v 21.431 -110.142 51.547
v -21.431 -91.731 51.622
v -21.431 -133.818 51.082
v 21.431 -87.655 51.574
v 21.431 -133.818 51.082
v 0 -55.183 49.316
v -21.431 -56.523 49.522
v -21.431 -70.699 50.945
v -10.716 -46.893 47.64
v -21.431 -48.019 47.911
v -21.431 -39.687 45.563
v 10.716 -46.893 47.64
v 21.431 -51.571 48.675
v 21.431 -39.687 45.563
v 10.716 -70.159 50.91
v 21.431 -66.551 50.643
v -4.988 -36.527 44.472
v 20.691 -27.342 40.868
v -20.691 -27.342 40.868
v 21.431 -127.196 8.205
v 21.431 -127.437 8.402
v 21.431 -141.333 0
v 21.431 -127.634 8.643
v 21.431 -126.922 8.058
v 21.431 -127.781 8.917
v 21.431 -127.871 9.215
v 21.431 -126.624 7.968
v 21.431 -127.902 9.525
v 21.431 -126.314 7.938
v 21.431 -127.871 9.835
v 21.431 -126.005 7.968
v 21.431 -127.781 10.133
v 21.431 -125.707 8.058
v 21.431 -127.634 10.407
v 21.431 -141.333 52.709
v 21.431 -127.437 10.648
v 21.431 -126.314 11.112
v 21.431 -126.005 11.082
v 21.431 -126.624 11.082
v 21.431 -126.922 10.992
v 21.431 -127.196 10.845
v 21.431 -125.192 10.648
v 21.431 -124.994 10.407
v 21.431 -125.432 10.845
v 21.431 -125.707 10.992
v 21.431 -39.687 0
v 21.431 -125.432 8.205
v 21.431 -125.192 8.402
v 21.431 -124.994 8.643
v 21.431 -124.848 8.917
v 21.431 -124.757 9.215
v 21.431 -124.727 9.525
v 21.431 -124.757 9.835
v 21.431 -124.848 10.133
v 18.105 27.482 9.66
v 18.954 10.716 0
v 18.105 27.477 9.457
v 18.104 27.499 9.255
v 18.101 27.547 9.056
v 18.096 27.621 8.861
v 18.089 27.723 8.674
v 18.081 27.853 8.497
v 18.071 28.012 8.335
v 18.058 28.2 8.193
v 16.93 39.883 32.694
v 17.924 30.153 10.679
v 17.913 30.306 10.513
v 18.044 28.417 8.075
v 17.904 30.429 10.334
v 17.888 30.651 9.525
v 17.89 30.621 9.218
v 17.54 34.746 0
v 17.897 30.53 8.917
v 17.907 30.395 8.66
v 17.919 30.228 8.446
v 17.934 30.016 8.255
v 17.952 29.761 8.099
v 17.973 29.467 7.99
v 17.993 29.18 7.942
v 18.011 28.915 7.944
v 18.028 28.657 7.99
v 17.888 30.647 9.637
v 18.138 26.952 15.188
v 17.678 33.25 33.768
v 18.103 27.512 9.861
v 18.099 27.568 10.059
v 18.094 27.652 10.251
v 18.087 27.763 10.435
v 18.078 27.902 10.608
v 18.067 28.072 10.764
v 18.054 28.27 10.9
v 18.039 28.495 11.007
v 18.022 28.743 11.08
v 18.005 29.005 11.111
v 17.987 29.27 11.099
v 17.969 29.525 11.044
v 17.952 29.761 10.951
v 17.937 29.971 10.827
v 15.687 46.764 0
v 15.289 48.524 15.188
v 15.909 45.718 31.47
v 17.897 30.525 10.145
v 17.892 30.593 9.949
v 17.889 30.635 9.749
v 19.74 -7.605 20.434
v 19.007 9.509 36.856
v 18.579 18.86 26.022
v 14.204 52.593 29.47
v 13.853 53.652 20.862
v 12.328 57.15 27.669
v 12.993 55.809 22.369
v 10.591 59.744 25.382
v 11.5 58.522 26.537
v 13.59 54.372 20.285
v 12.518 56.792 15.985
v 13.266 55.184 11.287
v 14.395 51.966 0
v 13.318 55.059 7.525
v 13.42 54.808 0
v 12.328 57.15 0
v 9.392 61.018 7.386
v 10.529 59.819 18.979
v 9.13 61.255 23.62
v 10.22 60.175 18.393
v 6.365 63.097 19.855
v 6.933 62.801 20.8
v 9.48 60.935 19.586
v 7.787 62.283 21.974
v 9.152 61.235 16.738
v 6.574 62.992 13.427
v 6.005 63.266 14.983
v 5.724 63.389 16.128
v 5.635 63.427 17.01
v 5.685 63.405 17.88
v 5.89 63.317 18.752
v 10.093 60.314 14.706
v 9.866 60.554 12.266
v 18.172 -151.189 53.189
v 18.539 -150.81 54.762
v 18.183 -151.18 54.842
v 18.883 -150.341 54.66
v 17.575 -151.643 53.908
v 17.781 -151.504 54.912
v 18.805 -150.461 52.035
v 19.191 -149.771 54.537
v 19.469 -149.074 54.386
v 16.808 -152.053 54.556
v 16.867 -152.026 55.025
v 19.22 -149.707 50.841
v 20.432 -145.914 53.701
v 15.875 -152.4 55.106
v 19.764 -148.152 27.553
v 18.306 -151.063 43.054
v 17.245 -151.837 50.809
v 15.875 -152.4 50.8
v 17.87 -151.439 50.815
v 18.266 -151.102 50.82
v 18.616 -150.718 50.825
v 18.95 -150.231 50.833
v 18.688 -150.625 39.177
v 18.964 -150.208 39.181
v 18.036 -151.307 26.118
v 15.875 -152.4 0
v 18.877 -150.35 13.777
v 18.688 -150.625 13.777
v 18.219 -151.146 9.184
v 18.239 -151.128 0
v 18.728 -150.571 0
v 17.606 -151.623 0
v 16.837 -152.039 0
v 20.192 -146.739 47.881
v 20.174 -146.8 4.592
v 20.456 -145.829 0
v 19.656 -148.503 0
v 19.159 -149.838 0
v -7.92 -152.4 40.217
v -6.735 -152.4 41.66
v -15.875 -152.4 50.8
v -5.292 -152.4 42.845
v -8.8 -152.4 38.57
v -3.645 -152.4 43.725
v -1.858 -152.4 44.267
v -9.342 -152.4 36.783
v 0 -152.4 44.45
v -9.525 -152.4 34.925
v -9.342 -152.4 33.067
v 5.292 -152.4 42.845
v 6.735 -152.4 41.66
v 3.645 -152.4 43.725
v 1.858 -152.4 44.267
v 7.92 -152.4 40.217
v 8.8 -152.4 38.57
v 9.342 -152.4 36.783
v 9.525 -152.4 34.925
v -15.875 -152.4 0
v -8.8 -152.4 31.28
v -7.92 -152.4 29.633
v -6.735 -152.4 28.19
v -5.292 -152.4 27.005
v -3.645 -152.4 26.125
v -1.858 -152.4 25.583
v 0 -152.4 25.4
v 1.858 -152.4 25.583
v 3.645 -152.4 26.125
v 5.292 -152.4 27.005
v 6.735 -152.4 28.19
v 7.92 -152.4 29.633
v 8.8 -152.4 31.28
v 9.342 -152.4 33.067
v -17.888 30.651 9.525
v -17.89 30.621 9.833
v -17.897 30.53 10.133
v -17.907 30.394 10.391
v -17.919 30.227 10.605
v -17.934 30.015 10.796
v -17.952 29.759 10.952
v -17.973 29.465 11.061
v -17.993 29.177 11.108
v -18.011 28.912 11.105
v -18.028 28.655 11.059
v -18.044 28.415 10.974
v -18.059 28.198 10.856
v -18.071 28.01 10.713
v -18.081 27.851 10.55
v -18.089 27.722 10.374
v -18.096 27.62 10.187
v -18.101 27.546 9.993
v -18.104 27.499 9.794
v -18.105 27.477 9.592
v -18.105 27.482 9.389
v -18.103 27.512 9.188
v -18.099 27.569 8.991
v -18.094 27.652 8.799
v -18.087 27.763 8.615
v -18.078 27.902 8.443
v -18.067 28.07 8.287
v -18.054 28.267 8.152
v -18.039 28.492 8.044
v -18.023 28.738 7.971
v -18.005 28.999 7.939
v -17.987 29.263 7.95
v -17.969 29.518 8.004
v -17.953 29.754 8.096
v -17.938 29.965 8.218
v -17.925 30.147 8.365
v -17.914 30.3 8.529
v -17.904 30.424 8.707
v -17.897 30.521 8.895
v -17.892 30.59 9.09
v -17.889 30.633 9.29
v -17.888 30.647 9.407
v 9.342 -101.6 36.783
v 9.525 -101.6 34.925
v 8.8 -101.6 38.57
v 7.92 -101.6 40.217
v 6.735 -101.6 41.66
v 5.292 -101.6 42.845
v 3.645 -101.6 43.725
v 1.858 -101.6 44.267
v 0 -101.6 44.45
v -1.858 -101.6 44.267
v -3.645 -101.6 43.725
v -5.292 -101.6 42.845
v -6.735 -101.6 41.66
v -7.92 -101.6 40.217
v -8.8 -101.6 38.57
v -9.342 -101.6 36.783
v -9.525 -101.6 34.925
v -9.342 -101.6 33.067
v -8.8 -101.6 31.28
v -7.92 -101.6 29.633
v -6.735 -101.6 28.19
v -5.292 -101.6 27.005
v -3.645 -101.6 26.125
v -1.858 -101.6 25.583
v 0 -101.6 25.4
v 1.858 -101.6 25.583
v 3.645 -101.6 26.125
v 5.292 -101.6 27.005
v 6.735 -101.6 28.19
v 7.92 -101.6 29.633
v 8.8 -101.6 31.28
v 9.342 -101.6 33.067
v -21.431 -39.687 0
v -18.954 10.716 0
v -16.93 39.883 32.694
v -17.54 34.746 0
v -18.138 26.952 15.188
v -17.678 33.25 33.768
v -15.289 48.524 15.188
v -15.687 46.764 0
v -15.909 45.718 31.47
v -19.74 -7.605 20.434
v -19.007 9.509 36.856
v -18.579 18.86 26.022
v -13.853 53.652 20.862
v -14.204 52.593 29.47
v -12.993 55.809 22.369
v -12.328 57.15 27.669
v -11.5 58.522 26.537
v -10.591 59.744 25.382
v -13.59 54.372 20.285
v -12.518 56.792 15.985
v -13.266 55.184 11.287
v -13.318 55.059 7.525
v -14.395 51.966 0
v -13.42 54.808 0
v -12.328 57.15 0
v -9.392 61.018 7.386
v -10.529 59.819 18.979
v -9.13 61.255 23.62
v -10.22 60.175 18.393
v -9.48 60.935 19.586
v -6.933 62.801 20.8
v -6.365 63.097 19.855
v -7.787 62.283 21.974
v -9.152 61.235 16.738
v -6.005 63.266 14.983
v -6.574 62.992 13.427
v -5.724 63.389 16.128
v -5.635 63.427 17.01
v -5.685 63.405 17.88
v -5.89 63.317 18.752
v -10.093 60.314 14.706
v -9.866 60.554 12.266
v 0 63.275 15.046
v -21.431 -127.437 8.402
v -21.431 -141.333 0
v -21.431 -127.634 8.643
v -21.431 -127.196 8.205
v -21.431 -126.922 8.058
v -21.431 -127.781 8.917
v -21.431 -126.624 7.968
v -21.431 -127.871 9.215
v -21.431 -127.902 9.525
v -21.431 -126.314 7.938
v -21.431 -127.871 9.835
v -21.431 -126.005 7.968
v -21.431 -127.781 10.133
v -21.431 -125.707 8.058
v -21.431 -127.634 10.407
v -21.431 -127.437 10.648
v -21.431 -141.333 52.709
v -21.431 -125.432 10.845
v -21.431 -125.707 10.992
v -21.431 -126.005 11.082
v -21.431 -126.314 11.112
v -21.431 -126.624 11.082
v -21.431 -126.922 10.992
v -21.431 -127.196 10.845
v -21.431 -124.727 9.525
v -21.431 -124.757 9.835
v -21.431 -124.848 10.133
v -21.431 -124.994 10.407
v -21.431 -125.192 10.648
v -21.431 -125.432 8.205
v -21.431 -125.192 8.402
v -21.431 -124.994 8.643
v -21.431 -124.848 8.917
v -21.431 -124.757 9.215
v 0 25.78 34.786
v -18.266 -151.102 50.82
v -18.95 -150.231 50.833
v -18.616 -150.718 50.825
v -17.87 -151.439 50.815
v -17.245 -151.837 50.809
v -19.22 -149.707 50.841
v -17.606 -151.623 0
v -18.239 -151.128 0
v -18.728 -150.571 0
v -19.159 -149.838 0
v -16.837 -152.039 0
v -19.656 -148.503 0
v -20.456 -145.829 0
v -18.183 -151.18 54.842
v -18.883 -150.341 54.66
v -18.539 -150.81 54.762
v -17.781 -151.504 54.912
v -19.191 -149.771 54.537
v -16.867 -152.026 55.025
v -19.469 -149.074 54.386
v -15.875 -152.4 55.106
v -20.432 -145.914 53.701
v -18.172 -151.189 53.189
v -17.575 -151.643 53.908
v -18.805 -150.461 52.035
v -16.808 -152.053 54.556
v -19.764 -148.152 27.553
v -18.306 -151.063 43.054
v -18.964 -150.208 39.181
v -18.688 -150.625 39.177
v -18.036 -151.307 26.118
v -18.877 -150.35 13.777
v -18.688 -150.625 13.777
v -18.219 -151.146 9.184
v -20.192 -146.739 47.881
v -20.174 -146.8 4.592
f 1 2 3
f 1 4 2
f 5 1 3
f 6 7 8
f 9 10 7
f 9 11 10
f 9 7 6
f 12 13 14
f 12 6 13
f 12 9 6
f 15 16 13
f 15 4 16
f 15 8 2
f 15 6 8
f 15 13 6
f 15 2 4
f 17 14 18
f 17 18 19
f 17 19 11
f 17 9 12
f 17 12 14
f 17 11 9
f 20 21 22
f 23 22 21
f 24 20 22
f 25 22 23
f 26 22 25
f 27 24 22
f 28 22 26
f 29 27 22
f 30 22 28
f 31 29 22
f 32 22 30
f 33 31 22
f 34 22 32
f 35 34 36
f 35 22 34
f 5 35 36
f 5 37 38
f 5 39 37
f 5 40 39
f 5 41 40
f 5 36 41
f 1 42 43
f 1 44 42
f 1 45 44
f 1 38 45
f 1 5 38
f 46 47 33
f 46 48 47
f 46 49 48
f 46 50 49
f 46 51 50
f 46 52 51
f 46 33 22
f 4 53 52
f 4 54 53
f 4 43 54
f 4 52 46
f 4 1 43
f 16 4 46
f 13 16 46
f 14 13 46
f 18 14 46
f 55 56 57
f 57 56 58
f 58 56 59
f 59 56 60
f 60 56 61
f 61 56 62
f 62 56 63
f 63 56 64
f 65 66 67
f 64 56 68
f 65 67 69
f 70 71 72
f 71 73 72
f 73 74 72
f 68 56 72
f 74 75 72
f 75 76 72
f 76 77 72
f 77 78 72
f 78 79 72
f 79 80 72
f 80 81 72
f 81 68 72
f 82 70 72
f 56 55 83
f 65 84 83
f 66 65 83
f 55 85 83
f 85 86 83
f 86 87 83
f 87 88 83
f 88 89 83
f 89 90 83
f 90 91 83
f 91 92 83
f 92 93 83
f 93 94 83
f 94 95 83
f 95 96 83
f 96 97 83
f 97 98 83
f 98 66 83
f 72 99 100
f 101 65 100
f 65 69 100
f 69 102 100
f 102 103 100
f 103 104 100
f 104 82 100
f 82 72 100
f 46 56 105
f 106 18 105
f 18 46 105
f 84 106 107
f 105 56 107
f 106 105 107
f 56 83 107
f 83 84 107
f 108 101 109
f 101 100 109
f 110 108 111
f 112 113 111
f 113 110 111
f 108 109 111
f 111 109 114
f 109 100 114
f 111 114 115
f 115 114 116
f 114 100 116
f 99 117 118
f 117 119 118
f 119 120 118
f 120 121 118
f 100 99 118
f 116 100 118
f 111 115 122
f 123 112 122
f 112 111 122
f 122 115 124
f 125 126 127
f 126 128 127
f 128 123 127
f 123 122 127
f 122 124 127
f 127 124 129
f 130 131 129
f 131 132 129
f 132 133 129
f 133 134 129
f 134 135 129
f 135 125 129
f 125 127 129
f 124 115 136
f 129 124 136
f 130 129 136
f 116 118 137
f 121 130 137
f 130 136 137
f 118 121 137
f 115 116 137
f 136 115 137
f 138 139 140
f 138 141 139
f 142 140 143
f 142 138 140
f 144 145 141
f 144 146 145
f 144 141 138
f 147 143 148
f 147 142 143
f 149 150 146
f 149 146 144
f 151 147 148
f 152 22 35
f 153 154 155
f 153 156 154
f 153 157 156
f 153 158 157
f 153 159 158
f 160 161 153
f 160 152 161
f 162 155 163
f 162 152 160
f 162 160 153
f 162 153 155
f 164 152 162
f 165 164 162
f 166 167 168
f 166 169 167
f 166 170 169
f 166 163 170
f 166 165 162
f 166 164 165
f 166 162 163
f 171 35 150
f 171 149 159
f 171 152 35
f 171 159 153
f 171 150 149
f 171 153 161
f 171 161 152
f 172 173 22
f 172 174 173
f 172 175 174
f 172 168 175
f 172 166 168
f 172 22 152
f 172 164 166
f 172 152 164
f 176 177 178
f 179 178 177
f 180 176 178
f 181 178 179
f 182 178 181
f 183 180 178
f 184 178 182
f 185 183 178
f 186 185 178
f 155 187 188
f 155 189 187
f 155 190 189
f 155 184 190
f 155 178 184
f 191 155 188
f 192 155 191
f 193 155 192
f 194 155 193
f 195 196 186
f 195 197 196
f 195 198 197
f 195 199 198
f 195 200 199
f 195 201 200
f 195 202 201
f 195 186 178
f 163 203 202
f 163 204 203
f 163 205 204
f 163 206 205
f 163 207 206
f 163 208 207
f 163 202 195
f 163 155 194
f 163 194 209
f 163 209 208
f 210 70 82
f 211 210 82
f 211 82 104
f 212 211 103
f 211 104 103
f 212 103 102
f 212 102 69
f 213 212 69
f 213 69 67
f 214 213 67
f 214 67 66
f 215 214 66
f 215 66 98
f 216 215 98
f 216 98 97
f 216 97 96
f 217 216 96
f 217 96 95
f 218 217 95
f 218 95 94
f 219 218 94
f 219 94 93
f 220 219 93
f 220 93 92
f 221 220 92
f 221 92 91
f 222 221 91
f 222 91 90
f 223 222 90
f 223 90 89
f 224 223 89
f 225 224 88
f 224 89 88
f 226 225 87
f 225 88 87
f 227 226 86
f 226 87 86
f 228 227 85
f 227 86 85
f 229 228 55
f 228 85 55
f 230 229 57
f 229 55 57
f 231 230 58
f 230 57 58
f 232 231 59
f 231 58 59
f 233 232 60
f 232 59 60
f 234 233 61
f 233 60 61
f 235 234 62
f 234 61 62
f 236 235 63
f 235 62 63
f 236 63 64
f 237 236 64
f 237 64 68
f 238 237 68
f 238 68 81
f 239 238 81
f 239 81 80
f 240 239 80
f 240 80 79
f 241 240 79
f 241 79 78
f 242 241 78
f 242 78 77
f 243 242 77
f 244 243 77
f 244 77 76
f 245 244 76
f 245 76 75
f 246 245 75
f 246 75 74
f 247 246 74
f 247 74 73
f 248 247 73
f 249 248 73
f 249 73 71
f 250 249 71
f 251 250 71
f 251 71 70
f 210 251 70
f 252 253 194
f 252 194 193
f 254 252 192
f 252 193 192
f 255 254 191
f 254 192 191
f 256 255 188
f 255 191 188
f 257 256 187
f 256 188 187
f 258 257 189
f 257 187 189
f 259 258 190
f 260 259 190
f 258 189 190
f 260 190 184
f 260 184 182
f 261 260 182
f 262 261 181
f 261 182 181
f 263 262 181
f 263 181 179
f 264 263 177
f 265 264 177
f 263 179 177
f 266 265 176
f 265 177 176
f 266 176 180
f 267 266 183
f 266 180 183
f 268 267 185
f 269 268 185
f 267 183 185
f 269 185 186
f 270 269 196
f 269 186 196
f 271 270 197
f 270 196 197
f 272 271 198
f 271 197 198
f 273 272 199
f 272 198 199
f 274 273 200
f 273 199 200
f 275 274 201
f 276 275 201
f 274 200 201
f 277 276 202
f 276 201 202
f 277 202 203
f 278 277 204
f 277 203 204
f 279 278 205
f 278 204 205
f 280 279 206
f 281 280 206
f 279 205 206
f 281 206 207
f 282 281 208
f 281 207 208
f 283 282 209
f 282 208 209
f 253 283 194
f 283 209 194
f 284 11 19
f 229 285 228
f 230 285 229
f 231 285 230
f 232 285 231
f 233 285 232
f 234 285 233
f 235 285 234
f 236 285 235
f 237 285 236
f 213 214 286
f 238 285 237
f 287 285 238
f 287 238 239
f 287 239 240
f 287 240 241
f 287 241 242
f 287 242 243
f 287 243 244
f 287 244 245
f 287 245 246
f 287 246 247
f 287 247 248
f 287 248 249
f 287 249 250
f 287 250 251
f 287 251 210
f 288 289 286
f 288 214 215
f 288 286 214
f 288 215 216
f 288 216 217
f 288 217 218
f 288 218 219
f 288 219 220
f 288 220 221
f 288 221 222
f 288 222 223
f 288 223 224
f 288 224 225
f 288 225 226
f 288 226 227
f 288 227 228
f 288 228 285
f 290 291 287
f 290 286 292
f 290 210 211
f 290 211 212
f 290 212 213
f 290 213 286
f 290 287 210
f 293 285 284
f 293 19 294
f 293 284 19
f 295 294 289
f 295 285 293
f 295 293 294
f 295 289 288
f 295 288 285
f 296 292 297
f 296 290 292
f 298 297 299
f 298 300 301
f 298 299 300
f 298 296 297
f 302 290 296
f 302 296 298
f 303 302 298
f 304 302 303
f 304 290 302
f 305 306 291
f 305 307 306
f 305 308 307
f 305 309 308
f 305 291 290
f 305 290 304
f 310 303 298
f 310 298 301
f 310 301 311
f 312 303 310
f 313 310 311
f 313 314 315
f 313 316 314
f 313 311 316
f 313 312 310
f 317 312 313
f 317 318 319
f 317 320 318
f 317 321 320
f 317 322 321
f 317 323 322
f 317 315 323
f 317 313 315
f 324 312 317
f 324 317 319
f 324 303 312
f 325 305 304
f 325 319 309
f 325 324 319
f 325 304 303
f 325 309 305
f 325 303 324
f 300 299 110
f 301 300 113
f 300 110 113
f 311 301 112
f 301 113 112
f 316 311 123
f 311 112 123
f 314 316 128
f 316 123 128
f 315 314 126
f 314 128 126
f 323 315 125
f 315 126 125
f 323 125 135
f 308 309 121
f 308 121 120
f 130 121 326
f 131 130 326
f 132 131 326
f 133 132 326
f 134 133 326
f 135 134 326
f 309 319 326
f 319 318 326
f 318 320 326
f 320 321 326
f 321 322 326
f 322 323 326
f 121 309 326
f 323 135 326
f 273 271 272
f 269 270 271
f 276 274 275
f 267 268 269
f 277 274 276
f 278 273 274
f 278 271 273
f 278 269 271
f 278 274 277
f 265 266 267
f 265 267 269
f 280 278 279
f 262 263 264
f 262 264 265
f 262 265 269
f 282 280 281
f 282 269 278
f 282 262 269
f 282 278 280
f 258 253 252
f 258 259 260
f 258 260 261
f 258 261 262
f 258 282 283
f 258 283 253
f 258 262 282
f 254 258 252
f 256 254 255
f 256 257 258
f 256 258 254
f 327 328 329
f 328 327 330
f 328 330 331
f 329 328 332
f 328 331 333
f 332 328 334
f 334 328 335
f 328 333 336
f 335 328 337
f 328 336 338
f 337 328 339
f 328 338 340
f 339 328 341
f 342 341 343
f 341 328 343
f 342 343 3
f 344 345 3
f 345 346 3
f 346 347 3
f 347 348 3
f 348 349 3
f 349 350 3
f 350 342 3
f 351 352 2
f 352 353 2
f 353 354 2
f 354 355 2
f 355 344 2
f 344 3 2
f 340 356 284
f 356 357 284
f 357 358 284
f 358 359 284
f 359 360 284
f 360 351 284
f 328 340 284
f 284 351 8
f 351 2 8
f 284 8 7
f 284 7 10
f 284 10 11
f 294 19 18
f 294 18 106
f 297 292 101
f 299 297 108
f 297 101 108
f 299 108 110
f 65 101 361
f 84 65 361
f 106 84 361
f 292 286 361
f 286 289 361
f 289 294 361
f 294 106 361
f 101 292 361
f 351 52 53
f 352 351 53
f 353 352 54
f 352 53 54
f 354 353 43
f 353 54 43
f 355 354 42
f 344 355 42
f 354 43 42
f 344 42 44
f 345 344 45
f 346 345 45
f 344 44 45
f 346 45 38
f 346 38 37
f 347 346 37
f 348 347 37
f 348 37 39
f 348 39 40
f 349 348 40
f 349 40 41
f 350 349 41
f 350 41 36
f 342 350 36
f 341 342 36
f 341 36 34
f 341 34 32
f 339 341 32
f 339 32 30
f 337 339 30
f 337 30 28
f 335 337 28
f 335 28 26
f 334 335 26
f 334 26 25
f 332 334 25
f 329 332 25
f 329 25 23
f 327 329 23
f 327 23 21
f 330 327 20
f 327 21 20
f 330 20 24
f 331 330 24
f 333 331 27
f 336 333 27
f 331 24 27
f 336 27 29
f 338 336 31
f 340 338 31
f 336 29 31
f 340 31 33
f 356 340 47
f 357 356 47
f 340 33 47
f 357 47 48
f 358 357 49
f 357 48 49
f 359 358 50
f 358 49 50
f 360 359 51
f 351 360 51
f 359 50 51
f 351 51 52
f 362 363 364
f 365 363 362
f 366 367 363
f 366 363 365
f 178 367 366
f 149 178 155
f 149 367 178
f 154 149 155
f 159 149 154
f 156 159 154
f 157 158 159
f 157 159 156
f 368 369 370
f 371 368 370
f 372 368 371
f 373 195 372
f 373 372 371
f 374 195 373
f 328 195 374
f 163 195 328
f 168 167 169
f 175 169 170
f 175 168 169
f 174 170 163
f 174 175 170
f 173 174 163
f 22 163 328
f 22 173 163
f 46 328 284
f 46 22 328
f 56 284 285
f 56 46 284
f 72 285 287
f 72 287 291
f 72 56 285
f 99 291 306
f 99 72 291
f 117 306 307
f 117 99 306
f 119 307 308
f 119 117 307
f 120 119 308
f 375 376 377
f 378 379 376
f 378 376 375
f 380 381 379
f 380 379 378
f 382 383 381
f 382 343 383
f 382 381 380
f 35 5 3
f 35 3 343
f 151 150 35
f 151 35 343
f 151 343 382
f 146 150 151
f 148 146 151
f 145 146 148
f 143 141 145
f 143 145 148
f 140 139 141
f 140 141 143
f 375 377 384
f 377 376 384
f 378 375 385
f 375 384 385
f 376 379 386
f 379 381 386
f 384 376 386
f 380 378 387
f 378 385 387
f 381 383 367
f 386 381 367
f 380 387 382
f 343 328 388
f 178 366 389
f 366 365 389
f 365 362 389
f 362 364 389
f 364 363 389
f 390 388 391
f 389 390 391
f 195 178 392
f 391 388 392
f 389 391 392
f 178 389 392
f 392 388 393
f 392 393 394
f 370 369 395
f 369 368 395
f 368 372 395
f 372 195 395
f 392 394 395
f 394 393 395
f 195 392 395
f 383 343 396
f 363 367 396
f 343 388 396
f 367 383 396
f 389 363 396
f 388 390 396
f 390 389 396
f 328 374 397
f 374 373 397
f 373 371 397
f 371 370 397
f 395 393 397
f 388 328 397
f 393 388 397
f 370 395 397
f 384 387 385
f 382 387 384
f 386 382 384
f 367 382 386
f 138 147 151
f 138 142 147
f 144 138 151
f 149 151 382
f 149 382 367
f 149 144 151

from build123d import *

# Parameters (mm, degrees)
F1_DEPTH = 21.43125
F2_R     = 9.525
F3_DEPTH = 50.8
F4_R     = 1.5875
F6_DEPTH = 42.8635
F7_DEPTH = 55.1070625421


with BuildPart() as f1:
    # F0 (on Right) → F1 (new body, symmetric)
    with BuildSketch(Plane.YZ):
        Polygon((-152.4, 69.85), (-152.4, 0), (152.4, 0), (152.4, 19.05), align=None)
    extrude(amount=F1_DEPTH, both=True)

    # F2 (on face) → F3 (cut)
    with BuildSketch(Plane.XZ.offset(152.4)):
        with Locations((0, 34.925)):
            Circle(F2_R)
    extrude(amount=-F3_DEPTH, mode=Mode.SUBTRACT)

    # F4 (on face) → F6 (intersect, through all)
    with BuildSketch(Plane.YZ.offset(21.43125)):
        with BuildLine():
            Line((-149.7065071007, 50.8408099003), (-152.4, 50.7999993861))
            Line((-152.4, 50.7999993861), (-152.4, 0))
            Line((-152.4, 0), (57.15, 0))
            add(Edge.make_bspline(
                [(57.15, 27.6693087071), (62.9540532827, 23.1574121863), (64.8345353288, 15.2838414165), (60.2900164004, 5.1415623251), (57.15, 0)],
                knots=[0, 0, 0, 0, 0.4816979855, 1, 1, 1, 1], degree=3))
            add(Edge.make_bspline(
                [(-27.3415464908, 40.8684164286), (-8.4446382918, 39.1311924639), (24.8142205738, 35.0208202174), (47.8670857847, 31.8072736263), (57.15, 27.6693087071)],
                knots=[0, 0, 0, 0, 0.5631768545, 1, 1, 1, 1], degree=3))
            add(Edge.make_bspline(
                [(-27.3415464908, 40.8684164286), (-35.3624819778, 44.1492309528), (-56.5713824039, 52.8243373258), (-104.2014900273, 51.7497373627), (-133.8184987721, 51.0815373923)],
                knots=[0, 0, 0, 0, 0.3781872386, 1, 1, 1, 1], degree=3))
            Line((-133.8184987721, 51.0815373923), (-152.4, 55.1060624421))
            Line((-152.4, 55.1060624421), (-149.7065071007, 50.8408099003))
        make_face()
        with Locations((-126.3143569231, 9.525)):
            Circle(F4_R, mode=Mode.SUBTRACT)
        with Locations((29.0634203702, 9.525)):
            Circle(F4_R, mode=Mode.SUBTRACT)
    extrude(amount=-F6_DEPTH, mode=Mode.INTERSECT)

    # F5 (on face) → F7 (intersect, through all)
    with BuildSketch(Plane(origin=(0, 0, 0), x_dir=(1, 0, 0), z_dir=(0, 0, -1))):
        with BuildLine():
            add(Edge.make_bspline(
                [(-21.43125, 141.3332819939), (-21.105100692, 143.7924098417), (-19.7181081761, 148.2729204744), (-18.7462978065, 151.51001513), (-15.875, 152.4)],
                knots=[0, 0, 0, 0, 0.5247215937, 1, 1, 1, 1], degree=3))
            Line((-21.43125, 141.3332819939), (-21.43125, 39.6870598197))
            add(Edge.make_bspline(
                [(-21.43125, 39.6870598197), (-19.8348436954, 15.699516797), (-18.7155051196, -26.3628345266), (-16.2676267963, -47.1015389649), (-10.981831047, -64.1384903262), (0, -64.5855814219)],
                knots=[0, 0, 0, 0, 0.4656404532, 0.7315566193, 1, 1, 1, 1], degree=3))
            add(Edge.make_bspline(
                [(21.43125, 39.6870598197), (19.8348436954, 15.699516797), (18.7155051196, -26.3628345266), (16.2676267963, -47.1015389649), (10.981831047, -64.1384903262), (0, -64.5855814219)],
                knots=[0, 0, 0, 0, 0.4656404532, 0.7315566193, 1, 1, 1, 1], degree=3))
            Line((21.43125, 39.6870598197), (21.43125, 141.3332819939))
            add(Edge.make_bspline(
                [(21.43125, 141.3332819939), (21.105100692, 143.7924098417), (19.7181081761, 148.2729204744), (18.7462978065, 151.51001513), (15.875, 152.4)],
                knots=[0, 0, 0, 0, 0.5247215937, 1, 1, 1, 1], degree=3))
            Line((15.875, 152.4), (-15.875, 152.4))
        make_face()
    extrude(amount=-F7_DEPTH, mode=Mode.INTERSECT)


solid = f1.part
